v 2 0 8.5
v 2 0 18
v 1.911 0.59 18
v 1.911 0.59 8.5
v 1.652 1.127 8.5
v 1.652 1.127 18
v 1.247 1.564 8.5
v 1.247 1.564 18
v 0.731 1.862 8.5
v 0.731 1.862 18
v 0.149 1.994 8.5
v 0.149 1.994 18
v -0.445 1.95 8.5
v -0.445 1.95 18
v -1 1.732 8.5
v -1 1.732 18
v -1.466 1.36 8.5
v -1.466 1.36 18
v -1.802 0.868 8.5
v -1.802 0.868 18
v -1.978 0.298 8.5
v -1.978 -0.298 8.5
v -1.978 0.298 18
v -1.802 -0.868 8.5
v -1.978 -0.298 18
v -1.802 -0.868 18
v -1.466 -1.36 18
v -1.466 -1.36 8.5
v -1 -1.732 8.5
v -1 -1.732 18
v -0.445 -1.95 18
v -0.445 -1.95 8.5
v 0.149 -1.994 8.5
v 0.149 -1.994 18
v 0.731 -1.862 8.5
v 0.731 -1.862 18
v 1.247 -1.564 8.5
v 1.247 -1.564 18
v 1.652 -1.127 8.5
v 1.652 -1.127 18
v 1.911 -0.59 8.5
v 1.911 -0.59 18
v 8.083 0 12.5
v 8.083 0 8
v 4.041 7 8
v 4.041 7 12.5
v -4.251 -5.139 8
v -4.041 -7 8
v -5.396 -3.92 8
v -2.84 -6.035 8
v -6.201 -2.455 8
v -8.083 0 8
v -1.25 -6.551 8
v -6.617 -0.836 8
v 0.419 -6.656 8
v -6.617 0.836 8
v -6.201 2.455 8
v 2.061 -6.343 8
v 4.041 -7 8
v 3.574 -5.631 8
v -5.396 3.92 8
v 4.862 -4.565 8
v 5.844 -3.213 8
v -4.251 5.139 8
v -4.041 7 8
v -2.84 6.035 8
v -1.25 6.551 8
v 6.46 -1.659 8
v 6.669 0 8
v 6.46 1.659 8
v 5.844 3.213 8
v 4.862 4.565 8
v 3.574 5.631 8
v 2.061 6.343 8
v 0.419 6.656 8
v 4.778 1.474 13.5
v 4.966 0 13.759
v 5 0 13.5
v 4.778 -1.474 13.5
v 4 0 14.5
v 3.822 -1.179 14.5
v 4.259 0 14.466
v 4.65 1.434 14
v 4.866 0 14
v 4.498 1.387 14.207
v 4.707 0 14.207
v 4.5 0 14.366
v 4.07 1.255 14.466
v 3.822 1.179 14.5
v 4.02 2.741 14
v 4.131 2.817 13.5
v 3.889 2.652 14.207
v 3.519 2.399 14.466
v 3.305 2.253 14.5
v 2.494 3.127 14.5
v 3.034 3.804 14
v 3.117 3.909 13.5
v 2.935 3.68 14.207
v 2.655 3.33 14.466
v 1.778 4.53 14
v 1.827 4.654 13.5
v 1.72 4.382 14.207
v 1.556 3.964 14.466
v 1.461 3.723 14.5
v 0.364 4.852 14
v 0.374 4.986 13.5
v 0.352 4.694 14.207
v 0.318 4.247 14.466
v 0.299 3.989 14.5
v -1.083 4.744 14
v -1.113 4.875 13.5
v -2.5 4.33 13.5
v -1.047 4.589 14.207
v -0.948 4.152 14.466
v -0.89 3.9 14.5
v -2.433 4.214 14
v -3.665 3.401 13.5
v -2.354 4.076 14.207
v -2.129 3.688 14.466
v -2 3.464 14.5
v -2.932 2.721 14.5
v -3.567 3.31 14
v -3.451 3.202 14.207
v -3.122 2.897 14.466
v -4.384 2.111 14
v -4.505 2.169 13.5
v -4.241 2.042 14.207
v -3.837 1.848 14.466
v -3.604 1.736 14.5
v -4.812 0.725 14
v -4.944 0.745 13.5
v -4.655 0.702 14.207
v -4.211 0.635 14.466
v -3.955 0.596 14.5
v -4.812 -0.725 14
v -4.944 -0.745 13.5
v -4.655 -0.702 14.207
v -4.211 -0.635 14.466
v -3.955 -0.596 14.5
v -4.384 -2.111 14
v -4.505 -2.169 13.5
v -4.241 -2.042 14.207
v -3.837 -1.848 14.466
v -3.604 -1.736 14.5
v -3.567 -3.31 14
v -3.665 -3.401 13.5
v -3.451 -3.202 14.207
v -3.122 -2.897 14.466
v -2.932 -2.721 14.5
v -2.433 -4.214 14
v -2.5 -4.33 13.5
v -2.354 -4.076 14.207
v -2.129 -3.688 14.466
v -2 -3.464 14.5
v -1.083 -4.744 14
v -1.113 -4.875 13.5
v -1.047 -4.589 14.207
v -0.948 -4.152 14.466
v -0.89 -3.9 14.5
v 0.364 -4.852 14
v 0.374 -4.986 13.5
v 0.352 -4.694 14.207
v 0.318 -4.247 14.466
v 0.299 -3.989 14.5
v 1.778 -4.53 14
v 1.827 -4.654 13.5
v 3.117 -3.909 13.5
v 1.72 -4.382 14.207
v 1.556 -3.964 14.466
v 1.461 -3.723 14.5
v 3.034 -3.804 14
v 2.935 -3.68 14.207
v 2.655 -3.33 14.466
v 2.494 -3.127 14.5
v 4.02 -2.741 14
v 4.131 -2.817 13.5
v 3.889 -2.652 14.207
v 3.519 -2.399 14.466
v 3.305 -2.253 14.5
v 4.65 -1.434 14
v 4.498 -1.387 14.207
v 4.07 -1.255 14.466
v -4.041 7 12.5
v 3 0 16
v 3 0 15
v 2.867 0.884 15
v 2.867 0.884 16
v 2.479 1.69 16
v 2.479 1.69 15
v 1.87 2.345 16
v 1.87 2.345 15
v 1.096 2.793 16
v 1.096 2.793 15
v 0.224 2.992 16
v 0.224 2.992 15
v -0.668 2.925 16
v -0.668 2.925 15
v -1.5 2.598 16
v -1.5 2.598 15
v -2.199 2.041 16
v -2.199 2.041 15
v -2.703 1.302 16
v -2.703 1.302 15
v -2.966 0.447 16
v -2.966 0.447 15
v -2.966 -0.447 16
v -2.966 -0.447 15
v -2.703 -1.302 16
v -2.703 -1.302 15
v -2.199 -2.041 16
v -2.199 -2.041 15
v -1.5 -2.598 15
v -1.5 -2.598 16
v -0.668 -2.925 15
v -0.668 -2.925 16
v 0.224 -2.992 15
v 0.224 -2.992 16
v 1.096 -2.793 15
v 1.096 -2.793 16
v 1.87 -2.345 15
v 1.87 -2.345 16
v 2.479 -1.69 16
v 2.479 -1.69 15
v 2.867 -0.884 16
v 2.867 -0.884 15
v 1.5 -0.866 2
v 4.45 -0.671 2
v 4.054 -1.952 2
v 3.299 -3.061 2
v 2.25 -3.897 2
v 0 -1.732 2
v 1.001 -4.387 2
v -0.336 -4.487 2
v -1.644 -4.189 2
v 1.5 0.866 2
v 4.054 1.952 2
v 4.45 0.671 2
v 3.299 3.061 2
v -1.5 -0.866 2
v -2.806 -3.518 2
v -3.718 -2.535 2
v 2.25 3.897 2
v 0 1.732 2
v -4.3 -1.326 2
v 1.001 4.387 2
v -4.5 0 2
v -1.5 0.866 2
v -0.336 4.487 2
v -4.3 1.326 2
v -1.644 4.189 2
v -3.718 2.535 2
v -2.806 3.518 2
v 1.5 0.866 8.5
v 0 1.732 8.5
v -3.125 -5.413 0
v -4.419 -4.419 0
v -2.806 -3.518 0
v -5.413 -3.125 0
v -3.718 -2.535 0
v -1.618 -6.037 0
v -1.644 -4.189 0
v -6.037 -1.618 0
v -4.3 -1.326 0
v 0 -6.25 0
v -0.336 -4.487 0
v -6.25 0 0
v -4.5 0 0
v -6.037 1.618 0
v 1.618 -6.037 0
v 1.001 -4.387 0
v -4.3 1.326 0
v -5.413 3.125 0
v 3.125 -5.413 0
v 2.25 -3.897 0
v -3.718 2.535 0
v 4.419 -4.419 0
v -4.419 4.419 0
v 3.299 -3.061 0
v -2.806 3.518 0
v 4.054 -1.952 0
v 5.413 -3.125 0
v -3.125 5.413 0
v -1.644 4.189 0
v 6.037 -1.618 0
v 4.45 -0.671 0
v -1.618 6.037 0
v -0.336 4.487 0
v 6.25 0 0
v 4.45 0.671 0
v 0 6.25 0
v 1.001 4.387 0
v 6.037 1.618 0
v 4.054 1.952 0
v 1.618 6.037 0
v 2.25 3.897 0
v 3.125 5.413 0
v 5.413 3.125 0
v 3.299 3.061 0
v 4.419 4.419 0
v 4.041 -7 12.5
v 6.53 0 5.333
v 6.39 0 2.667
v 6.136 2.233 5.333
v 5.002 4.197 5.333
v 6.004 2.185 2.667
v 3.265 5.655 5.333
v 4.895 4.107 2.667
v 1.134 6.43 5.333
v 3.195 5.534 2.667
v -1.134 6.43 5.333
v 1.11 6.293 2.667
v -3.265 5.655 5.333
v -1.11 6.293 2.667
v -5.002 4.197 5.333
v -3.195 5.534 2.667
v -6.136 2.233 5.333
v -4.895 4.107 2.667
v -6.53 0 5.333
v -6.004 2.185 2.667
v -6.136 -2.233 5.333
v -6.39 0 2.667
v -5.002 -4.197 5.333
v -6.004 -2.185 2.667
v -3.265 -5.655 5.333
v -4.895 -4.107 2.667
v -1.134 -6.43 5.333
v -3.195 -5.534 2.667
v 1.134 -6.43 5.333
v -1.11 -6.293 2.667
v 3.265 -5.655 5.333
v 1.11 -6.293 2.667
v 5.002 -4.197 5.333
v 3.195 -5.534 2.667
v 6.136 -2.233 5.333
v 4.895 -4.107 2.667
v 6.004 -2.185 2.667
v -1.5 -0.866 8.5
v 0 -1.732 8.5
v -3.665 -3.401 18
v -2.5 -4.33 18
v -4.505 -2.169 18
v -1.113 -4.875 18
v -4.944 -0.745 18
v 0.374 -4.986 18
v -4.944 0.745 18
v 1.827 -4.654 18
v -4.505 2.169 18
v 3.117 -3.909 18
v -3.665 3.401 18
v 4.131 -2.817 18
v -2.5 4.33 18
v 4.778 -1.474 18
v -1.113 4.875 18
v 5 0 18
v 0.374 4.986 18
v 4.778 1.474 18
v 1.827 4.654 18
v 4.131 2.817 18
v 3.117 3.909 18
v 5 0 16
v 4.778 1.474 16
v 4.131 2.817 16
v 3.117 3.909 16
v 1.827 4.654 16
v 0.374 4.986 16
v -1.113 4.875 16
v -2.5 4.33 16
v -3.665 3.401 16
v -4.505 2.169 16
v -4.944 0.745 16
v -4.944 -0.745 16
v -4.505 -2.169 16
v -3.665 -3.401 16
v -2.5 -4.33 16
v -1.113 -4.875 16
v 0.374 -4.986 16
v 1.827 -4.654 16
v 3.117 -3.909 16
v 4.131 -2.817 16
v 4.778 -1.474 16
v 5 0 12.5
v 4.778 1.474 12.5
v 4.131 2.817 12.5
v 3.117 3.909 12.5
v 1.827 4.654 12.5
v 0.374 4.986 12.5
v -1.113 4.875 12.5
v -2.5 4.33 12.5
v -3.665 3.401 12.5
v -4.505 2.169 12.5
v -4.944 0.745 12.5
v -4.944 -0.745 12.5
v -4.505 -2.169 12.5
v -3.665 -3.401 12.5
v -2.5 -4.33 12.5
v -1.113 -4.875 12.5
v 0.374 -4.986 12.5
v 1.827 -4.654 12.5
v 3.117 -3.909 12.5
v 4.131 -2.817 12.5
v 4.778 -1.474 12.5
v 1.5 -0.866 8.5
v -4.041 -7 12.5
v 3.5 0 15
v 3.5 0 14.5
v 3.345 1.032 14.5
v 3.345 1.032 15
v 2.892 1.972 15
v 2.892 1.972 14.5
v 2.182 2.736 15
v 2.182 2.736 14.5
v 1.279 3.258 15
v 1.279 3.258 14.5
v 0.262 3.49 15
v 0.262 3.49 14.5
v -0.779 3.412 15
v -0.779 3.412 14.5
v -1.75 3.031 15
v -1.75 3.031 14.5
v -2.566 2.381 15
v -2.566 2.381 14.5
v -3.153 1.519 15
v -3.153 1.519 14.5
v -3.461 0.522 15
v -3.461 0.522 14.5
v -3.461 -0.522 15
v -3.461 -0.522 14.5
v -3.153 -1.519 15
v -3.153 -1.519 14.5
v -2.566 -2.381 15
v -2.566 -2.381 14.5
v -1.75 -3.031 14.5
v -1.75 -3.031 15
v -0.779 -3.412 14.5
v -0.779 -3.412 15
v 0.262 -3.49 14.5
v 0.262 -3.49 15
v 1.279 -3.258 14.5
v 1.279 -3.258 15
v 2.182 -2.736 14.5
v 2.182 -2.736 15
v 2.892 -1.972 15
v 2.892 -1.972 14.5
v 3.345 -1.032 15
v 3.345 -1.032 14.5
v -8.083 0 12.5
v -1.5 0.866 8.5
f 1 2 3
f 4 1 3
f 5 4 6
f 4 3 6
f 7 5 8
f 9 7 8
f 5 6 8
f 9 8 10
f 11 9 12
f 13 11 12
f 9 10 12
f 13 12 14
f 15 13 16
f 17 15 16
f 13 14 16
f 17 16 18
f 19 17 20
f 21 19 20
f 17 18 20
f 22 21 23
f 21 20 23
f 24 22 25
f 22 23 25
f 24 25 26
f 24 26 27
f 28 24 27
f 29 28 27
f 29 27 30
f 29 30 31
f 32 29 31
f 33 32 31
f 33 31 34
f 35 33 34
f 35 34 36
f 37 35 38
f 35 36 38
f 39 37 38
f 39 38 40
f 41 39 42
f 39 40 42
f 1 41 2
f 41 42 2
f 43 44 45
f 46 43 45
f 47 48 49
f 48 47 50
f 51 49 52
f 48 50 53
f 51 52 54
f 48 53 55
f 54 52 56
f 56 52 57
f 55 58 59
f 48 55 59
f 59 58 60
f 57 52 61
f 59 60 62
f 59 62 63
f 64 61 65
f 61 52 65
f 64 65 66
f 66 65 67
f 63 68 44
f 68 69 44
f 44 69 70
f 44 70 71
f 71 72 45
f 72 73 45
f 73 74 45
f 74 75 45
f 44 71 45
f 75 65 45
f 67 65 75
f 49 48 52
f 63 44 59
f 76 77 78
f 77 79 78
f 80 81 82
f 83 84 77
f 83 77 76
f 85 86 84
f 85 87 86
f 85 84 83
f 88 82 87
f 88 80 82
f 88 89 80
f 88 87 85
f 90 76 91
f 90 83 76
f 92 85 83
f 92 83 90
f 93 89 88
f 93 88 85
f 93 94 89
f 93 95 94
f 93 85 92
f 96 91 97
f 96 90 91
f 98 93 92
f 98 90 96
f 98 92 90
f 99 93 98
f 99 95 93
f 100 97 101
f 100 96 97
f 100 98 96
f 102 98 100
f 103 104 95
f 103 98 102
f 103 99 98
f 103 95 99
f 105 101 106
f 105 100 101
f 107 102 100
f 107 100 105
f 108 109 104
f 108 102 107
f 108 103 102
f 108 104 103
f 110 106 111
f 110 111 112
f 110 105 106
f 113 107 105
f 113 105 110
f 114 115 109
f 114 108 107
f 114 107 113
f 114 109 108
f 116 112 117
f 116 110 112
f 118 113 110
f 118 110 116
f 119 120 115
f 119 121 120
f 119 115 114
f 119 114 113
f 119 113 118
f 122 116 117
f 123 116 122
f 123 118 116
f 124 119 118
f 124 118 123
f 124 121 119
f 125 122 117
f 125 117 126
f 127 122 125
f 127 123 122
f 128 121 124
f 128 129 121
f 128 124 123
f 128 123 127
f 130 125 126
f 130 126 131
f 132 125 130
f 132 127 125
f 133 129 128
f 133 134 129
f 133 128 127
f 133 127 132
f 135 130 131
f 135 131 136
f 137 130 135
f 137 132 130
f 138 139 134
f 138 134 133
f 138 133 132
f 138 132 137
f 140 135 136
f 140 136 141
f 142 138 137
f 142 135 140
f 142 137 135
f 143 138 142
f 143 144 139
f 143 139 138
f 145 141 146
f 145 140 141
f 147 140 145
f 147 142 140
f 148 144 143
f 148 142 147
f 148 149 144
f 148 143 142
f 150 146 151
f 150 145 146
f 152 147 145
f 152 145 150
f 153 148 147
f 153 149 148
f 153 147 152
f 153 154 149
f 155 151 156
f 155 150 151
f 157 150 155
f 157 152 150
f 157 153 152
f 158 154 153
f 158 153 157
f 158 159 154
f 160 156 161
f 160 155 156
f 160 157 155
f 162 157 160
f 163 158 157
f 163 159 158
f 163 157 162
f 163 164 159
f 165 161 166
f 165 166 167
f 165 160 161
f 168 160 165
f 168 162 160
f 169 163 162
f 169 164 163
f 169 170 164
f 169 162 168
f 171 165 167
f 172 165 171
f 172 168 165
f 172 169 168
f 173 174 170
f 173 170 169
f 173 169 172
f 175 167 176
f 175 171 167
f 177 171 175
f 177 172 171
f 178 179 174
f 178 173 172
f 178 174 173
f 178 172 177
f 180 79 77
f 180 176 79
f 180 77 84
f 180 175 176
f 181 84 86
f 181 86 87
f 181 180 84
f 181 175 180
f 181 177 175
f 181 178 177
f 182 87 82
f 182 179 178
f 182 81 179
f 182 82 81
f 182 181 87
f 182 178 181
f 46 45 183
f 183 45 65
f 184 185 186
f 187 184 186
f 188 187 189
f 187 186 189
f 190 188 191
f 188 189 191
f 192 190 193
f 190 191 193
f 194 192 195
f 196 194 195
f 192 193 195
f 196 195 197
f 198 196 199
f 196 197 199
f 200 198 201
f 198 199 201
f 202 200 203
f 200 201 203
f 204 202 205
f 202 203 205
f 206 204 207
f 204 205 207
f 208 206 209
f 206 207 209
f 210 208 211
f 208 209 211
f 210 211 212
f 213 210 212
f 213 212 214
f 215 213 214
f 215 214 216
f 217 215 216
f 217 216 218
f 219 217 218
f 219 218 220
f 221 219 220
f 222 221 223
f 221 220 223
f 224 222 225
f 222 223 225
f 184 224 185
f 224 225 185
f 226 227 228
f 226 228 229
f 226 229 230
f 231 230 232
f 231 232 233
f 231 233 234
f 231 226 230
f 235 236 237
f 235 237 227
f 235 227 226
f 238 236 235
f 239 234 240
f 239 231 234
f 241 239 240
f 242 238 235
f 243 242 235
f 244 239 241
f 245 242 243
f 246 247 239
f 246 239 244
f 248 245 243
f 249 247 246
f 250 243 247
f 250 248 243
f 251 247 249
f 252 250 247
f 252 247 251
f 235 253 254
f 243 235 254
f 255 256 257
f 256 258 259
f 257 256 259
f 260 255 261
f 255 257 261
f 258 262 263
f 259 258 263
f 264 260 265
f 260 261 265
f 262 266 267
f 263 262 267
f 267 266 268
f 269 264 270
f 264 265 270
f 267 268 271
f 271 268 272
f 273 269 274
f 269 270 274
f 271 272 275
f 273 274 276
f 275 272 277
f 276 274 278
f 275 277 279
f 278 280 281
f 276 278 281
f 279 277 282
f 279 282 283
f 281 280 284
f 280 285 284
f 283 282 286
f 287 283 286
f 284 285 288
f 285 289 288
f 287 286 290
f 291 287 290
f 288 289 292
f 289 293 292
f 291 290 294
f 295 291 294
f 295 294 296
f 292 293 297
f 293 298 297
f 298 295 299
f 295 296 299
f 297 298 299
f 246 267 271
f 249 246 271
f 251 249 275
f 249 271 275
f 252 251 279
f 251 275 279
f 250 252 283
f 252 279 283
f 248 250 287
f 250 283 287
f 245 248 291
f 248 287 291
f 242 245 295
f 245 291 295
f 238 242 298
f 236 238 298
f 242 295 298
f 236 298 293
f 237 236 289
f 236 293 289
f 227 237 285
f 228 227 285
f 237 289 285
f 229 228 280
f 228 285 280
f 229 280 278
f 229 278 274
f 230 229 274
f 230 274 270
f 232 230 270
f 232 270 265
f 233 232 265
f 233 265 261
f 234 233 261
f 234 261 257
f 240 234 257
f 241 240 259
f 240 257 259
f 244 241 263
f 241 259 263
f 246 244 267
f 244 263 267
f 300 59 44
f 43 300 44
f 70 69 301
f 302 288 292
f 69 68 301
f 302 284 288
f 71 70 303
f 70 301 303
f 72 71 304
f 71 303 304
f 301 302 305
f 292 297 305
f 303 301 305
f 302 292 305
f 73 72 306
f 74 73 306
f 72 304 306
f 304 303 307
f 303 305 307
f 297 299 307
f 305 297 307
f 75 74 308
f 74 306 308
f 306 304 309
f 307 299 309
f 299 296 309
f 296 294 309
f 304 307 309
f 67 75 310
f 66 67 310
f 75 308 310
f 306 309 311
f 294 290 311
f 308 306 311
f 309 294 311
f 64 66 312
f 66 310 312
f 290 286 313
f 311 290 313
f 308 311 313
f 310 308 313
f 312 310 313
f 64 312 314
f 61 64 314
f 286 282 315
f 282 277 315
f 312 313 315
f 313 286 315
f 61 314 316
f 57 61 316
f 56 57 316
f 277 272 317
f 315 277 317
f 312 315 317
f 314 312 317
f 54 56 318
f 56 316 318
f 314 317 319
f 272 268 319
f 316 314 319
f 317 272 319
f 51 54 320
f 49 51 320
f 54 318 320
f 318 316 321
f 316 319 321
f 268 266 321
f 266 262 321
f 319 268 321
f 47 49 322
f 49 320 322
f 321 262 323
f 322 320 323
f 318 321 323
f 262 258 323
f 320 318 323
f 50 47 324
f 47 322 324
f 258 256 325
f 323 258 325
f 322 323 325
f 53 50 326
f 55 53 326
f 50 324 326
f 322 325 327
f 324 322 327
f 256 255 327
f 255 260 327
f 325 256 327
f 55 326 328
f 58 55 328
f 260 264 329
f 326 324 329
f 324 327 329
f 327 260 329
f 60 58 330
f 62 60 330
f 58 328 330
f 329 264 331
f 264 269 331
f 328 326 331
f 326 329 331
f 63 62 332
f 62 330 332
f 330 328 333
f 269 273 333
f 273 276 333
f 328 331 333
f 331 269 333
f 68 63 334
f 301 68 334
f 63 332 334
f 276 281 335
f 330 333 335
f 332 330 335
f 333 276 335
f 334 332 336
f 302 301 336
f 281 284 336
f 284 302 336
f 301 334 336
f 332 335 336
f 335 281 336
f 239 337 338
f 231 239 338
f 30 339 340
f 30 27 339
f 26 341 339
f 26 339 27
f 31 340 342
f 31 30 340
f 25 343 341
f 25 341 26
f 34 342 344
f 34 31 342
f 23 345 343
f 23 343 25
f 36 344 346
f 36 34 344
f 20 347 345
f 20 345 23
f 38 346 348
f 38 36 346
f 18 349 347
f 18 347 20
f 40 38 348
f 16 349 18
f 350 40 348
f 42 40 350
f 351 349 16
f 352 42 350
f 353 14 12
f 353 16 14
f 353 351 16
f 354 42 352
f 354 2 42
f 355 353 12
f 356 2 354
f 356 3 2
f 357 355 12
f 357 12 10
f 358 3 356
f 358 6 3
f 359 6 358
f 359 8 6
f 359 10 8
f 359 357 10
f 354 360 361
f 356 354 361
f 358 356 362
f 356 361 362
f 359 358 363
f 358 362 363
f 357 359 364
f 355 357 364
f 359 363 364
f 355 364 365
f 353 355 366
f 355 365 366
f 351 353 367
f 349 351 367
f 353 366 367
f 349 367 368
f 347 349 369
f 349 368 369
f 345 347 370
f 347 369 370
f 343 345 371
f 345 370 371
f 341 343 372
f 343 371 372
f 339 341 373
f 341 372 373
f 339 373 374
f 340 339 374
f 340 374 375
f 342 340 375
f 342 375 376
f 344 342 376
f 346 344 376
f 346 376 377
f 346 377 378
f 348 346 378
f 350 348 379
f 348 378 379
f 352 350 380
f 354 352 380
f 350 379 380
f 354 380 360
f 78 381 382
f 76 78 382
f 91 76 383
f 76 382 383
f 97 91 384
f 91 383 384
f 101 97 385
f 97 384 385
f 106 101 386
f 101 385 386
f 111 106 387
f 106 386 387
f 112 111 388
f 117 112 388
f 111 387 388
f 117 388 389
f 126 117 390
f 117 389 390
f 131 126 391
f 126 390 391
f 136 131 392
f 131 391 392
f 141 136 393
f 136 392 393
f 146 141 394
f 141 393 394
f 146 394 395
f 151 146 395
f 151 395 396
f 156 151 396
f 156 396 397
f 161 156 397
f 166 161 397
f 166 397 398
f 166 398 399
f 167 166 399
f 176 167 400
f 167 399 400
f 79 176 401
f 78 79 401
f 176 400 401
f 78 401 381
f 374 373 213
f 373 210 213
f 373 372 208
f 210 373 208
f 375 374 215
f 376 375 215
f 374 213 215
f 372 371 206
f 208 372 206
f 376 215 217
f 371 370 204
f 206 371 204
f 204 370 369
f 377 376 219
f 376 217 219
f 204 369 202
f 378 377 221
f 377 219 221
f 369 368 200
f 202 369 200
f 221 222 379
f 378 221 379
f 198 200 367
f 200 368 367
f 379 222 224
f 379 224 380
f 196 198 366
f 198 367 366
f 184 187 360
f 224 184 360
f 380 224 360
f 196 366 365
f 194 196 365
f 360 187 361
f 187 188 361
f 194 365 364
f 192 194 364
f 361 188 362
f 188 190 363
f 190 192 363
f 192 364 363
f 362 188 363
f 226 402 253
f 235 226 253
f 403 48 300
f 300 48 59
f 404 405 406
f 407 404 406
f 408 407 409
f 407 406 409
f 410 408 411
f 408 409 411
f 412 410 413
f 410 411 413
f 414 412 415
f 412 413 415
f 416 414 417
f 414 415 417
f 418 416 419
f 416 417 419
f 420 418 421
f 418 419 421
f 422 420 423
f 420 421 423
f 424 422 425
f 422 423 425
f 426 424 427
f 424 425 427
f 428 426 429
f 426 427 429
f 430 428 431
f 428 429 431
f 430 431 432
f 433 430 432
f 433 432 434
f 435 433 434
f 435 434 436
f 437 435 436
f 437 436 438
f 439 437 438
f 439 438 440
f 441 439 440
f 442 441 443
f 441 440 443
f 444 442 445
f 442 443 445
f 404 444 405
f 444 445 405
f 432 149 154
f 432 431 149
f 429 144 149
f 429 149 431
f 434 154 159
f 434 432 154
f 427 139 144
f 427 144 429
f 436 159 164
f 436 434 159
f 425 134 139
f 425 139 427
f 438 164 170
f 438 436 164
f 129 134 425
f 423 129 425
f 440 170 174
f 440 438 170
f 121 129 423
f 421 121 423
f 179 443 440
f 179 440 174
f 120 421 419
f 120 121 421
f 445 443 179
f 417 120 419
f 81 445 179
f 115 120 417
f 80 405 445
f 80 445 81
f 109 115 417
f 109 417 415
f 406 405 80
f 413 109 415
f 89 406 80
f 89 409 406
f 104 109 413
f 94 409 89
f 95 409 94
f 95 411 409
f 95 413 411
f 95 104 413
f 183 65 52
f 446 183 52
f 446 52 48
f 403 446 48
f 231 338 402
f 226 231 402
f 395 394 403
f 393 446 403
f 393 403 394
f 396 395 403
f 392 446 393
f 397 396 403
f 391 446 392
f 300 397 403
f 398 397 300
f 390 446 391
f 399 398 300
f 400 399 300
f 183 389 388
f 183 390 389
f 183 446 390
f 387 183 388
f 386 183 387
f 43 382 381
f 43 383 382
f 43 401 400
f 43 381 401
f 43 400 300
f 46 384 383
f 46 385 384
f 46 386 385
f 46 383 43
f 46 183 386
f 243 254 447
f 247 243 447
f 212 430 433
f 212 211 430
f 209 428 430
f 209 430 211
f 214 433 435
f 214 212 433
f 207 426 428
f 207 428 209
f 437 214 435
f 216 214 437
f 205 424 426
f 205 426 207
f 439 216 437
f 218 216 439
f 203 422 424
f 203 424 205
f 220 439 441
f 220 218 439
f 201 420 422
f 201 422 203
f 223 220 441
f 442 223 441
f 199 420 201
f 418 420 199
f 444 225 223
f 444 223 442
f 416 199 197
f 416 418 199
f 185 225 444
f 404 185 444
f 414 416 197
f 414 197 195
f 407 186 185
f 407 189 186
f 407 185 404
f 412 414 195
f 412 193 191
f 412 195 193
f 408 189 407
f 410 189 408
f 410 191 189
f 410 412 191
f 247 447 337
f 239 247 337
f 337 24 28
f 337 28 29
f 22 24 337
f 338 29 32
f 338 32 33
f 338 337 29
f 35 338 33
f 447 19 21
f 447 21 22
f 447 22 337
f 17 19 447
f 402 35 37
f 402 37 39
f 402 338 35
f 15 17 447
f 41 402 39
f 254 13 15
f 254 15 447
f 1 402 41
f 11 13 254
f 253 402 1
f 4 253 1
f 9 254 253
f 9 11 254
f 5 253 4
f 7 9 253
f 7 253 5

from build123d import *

# Parameters (mm, degrees)
SKETCH1_R           = 6.25
BOSS_EXTRUDE1_DEPTH = 8
BOSS_EXTRUDE1_DRAFT = -3
BOSS_EXTRUDE2_DEPTH = 4.5
SKETCH3_R           = 5
BOSS_EXTRUDE3_DEPTH = 2
SKETCH9_R           = 3.5
BOSS_EXTRUDE6_DEPTH = 0.5
FILLET1_R           = 1
SKETCH4_R           = 3
BOSS_EXTRUDE4_DEPTH = 1
SKETCH5_R           = 5
BOSS_EXTRUDE5_DEPTH = 2
SKETCH6_R           = 2
CUT_EXTRUDE1_DEPTH  = 9.5
CUT_EXTRUDE2_DEPTH  = 6.5
SKETCH8_R           = 4.5
CUT_EXTRUDE3_DEPTH  = 2


with BuildPart() as part:
    # Sketch1 → Boss-Extrude1 (with draft: the straight prism first)
    with BuildSketch(Plane.XY):
        Circle(SKETCH1_R)
    extrude(amount=BOSS_EXTRUDE1_DEPTH)
    # Boss-Extrude1: the draft: its side faces are tilted about the plane it starts from
    boss_extrude1_sides = [part.faces().sort_by_distance(p)[0] for p in [
        (-6.25, 0, 4),
    ]]
    draft(boss_extrude1_sides, Plane.XY, BOSS_EXTRUDE1_DRAFT)

    # Sketch2 → Boss-Extrude2 (add)
    with BuildSketch(Plane.XY.offset(8)):
        Polygon((8.082903769, 0), (4.041451884, 7), (-4.041451884, 7), (-8.082903769, 0), (-4.041451884, -7), (4.041451884, -7), align=None)
    extrude(amount=BOSS_EXTRUDE2_DEPTH)

    # Sketch3 → Boss-Extrude3 (add)
    with BuildSketch(Plane.XY.offset(12.5)):
        Circle(SKETCH3_R)
    extrude(amount=BOSS_EXTRUDE3_DEPTH)

    # Sketch9 → Boss-Extrude6 (add)
    with BuildSketch(Plane.XY.offset(14.5)):
        Circle(SKETCH9_R)
    extrude(amount=BOSS_EXTRUDE6_DEPTH)

    # Fillet1
    fillet1_edges = [part.edges().sort_by_distance(p)[0] for p in [
        (-5, 0, 14.5),
    ]]
    fillet(fillet1_edges, radius=FILLET1_R)

    # Sketch4 → Boss-Extrude4 (add)
    with BuildSketch(Plane.XY.offset(15)):
        Circle(SKETCH4_R)
    extrude(amount=BOSS_EXTRUDE4_DEPTH)

    # Sketch5 → Boss-Extrude5 (add)
    with BuildSketch(Plane.XY.offset(16)):
        Circle(SKETCH5_R)
    extrude(amount=BOSS_EXTRUDE5_DEPTH)

    # Sketch6 → Cut-Extrude1 (cut)
    with BuildSketch(Plane.XY.offset(18)):
        Circle(SKETCH6_R)
    extrude(amount=-CUT_EXTRUDE1_DEPTH, mode=Mode.SUBTRACT)

    # Sketch7 → Cut-Extrude2 (cut)
    with BuildSketch(Plane.XY.offset(8.5)):
        Polygon((0, -1.732050808), (1.5, -0.866025404), (1.5, 0.866025404), (0, 1.732050808), (-1.5, 0.866025404), (-1.5, -0.866025404), align=None)
    extrude(amount=-CUT_EXTRUDE2_DEPTH, mode=Mode.SUBTRACT)

    # Sketch8 → Cut-Extrude3 (cut)
    with BuildSketch(Plane(origin=(0, 0, 0), x_dir=(-1, 0, 0), z_dir=(0, 0, -1))):
        Circle(SKETCH8_R)
    extrude(amount=-CUT_EXTRUDE3_DEPTH, mode=Mode.SUBTRACT)


solid = part.part
